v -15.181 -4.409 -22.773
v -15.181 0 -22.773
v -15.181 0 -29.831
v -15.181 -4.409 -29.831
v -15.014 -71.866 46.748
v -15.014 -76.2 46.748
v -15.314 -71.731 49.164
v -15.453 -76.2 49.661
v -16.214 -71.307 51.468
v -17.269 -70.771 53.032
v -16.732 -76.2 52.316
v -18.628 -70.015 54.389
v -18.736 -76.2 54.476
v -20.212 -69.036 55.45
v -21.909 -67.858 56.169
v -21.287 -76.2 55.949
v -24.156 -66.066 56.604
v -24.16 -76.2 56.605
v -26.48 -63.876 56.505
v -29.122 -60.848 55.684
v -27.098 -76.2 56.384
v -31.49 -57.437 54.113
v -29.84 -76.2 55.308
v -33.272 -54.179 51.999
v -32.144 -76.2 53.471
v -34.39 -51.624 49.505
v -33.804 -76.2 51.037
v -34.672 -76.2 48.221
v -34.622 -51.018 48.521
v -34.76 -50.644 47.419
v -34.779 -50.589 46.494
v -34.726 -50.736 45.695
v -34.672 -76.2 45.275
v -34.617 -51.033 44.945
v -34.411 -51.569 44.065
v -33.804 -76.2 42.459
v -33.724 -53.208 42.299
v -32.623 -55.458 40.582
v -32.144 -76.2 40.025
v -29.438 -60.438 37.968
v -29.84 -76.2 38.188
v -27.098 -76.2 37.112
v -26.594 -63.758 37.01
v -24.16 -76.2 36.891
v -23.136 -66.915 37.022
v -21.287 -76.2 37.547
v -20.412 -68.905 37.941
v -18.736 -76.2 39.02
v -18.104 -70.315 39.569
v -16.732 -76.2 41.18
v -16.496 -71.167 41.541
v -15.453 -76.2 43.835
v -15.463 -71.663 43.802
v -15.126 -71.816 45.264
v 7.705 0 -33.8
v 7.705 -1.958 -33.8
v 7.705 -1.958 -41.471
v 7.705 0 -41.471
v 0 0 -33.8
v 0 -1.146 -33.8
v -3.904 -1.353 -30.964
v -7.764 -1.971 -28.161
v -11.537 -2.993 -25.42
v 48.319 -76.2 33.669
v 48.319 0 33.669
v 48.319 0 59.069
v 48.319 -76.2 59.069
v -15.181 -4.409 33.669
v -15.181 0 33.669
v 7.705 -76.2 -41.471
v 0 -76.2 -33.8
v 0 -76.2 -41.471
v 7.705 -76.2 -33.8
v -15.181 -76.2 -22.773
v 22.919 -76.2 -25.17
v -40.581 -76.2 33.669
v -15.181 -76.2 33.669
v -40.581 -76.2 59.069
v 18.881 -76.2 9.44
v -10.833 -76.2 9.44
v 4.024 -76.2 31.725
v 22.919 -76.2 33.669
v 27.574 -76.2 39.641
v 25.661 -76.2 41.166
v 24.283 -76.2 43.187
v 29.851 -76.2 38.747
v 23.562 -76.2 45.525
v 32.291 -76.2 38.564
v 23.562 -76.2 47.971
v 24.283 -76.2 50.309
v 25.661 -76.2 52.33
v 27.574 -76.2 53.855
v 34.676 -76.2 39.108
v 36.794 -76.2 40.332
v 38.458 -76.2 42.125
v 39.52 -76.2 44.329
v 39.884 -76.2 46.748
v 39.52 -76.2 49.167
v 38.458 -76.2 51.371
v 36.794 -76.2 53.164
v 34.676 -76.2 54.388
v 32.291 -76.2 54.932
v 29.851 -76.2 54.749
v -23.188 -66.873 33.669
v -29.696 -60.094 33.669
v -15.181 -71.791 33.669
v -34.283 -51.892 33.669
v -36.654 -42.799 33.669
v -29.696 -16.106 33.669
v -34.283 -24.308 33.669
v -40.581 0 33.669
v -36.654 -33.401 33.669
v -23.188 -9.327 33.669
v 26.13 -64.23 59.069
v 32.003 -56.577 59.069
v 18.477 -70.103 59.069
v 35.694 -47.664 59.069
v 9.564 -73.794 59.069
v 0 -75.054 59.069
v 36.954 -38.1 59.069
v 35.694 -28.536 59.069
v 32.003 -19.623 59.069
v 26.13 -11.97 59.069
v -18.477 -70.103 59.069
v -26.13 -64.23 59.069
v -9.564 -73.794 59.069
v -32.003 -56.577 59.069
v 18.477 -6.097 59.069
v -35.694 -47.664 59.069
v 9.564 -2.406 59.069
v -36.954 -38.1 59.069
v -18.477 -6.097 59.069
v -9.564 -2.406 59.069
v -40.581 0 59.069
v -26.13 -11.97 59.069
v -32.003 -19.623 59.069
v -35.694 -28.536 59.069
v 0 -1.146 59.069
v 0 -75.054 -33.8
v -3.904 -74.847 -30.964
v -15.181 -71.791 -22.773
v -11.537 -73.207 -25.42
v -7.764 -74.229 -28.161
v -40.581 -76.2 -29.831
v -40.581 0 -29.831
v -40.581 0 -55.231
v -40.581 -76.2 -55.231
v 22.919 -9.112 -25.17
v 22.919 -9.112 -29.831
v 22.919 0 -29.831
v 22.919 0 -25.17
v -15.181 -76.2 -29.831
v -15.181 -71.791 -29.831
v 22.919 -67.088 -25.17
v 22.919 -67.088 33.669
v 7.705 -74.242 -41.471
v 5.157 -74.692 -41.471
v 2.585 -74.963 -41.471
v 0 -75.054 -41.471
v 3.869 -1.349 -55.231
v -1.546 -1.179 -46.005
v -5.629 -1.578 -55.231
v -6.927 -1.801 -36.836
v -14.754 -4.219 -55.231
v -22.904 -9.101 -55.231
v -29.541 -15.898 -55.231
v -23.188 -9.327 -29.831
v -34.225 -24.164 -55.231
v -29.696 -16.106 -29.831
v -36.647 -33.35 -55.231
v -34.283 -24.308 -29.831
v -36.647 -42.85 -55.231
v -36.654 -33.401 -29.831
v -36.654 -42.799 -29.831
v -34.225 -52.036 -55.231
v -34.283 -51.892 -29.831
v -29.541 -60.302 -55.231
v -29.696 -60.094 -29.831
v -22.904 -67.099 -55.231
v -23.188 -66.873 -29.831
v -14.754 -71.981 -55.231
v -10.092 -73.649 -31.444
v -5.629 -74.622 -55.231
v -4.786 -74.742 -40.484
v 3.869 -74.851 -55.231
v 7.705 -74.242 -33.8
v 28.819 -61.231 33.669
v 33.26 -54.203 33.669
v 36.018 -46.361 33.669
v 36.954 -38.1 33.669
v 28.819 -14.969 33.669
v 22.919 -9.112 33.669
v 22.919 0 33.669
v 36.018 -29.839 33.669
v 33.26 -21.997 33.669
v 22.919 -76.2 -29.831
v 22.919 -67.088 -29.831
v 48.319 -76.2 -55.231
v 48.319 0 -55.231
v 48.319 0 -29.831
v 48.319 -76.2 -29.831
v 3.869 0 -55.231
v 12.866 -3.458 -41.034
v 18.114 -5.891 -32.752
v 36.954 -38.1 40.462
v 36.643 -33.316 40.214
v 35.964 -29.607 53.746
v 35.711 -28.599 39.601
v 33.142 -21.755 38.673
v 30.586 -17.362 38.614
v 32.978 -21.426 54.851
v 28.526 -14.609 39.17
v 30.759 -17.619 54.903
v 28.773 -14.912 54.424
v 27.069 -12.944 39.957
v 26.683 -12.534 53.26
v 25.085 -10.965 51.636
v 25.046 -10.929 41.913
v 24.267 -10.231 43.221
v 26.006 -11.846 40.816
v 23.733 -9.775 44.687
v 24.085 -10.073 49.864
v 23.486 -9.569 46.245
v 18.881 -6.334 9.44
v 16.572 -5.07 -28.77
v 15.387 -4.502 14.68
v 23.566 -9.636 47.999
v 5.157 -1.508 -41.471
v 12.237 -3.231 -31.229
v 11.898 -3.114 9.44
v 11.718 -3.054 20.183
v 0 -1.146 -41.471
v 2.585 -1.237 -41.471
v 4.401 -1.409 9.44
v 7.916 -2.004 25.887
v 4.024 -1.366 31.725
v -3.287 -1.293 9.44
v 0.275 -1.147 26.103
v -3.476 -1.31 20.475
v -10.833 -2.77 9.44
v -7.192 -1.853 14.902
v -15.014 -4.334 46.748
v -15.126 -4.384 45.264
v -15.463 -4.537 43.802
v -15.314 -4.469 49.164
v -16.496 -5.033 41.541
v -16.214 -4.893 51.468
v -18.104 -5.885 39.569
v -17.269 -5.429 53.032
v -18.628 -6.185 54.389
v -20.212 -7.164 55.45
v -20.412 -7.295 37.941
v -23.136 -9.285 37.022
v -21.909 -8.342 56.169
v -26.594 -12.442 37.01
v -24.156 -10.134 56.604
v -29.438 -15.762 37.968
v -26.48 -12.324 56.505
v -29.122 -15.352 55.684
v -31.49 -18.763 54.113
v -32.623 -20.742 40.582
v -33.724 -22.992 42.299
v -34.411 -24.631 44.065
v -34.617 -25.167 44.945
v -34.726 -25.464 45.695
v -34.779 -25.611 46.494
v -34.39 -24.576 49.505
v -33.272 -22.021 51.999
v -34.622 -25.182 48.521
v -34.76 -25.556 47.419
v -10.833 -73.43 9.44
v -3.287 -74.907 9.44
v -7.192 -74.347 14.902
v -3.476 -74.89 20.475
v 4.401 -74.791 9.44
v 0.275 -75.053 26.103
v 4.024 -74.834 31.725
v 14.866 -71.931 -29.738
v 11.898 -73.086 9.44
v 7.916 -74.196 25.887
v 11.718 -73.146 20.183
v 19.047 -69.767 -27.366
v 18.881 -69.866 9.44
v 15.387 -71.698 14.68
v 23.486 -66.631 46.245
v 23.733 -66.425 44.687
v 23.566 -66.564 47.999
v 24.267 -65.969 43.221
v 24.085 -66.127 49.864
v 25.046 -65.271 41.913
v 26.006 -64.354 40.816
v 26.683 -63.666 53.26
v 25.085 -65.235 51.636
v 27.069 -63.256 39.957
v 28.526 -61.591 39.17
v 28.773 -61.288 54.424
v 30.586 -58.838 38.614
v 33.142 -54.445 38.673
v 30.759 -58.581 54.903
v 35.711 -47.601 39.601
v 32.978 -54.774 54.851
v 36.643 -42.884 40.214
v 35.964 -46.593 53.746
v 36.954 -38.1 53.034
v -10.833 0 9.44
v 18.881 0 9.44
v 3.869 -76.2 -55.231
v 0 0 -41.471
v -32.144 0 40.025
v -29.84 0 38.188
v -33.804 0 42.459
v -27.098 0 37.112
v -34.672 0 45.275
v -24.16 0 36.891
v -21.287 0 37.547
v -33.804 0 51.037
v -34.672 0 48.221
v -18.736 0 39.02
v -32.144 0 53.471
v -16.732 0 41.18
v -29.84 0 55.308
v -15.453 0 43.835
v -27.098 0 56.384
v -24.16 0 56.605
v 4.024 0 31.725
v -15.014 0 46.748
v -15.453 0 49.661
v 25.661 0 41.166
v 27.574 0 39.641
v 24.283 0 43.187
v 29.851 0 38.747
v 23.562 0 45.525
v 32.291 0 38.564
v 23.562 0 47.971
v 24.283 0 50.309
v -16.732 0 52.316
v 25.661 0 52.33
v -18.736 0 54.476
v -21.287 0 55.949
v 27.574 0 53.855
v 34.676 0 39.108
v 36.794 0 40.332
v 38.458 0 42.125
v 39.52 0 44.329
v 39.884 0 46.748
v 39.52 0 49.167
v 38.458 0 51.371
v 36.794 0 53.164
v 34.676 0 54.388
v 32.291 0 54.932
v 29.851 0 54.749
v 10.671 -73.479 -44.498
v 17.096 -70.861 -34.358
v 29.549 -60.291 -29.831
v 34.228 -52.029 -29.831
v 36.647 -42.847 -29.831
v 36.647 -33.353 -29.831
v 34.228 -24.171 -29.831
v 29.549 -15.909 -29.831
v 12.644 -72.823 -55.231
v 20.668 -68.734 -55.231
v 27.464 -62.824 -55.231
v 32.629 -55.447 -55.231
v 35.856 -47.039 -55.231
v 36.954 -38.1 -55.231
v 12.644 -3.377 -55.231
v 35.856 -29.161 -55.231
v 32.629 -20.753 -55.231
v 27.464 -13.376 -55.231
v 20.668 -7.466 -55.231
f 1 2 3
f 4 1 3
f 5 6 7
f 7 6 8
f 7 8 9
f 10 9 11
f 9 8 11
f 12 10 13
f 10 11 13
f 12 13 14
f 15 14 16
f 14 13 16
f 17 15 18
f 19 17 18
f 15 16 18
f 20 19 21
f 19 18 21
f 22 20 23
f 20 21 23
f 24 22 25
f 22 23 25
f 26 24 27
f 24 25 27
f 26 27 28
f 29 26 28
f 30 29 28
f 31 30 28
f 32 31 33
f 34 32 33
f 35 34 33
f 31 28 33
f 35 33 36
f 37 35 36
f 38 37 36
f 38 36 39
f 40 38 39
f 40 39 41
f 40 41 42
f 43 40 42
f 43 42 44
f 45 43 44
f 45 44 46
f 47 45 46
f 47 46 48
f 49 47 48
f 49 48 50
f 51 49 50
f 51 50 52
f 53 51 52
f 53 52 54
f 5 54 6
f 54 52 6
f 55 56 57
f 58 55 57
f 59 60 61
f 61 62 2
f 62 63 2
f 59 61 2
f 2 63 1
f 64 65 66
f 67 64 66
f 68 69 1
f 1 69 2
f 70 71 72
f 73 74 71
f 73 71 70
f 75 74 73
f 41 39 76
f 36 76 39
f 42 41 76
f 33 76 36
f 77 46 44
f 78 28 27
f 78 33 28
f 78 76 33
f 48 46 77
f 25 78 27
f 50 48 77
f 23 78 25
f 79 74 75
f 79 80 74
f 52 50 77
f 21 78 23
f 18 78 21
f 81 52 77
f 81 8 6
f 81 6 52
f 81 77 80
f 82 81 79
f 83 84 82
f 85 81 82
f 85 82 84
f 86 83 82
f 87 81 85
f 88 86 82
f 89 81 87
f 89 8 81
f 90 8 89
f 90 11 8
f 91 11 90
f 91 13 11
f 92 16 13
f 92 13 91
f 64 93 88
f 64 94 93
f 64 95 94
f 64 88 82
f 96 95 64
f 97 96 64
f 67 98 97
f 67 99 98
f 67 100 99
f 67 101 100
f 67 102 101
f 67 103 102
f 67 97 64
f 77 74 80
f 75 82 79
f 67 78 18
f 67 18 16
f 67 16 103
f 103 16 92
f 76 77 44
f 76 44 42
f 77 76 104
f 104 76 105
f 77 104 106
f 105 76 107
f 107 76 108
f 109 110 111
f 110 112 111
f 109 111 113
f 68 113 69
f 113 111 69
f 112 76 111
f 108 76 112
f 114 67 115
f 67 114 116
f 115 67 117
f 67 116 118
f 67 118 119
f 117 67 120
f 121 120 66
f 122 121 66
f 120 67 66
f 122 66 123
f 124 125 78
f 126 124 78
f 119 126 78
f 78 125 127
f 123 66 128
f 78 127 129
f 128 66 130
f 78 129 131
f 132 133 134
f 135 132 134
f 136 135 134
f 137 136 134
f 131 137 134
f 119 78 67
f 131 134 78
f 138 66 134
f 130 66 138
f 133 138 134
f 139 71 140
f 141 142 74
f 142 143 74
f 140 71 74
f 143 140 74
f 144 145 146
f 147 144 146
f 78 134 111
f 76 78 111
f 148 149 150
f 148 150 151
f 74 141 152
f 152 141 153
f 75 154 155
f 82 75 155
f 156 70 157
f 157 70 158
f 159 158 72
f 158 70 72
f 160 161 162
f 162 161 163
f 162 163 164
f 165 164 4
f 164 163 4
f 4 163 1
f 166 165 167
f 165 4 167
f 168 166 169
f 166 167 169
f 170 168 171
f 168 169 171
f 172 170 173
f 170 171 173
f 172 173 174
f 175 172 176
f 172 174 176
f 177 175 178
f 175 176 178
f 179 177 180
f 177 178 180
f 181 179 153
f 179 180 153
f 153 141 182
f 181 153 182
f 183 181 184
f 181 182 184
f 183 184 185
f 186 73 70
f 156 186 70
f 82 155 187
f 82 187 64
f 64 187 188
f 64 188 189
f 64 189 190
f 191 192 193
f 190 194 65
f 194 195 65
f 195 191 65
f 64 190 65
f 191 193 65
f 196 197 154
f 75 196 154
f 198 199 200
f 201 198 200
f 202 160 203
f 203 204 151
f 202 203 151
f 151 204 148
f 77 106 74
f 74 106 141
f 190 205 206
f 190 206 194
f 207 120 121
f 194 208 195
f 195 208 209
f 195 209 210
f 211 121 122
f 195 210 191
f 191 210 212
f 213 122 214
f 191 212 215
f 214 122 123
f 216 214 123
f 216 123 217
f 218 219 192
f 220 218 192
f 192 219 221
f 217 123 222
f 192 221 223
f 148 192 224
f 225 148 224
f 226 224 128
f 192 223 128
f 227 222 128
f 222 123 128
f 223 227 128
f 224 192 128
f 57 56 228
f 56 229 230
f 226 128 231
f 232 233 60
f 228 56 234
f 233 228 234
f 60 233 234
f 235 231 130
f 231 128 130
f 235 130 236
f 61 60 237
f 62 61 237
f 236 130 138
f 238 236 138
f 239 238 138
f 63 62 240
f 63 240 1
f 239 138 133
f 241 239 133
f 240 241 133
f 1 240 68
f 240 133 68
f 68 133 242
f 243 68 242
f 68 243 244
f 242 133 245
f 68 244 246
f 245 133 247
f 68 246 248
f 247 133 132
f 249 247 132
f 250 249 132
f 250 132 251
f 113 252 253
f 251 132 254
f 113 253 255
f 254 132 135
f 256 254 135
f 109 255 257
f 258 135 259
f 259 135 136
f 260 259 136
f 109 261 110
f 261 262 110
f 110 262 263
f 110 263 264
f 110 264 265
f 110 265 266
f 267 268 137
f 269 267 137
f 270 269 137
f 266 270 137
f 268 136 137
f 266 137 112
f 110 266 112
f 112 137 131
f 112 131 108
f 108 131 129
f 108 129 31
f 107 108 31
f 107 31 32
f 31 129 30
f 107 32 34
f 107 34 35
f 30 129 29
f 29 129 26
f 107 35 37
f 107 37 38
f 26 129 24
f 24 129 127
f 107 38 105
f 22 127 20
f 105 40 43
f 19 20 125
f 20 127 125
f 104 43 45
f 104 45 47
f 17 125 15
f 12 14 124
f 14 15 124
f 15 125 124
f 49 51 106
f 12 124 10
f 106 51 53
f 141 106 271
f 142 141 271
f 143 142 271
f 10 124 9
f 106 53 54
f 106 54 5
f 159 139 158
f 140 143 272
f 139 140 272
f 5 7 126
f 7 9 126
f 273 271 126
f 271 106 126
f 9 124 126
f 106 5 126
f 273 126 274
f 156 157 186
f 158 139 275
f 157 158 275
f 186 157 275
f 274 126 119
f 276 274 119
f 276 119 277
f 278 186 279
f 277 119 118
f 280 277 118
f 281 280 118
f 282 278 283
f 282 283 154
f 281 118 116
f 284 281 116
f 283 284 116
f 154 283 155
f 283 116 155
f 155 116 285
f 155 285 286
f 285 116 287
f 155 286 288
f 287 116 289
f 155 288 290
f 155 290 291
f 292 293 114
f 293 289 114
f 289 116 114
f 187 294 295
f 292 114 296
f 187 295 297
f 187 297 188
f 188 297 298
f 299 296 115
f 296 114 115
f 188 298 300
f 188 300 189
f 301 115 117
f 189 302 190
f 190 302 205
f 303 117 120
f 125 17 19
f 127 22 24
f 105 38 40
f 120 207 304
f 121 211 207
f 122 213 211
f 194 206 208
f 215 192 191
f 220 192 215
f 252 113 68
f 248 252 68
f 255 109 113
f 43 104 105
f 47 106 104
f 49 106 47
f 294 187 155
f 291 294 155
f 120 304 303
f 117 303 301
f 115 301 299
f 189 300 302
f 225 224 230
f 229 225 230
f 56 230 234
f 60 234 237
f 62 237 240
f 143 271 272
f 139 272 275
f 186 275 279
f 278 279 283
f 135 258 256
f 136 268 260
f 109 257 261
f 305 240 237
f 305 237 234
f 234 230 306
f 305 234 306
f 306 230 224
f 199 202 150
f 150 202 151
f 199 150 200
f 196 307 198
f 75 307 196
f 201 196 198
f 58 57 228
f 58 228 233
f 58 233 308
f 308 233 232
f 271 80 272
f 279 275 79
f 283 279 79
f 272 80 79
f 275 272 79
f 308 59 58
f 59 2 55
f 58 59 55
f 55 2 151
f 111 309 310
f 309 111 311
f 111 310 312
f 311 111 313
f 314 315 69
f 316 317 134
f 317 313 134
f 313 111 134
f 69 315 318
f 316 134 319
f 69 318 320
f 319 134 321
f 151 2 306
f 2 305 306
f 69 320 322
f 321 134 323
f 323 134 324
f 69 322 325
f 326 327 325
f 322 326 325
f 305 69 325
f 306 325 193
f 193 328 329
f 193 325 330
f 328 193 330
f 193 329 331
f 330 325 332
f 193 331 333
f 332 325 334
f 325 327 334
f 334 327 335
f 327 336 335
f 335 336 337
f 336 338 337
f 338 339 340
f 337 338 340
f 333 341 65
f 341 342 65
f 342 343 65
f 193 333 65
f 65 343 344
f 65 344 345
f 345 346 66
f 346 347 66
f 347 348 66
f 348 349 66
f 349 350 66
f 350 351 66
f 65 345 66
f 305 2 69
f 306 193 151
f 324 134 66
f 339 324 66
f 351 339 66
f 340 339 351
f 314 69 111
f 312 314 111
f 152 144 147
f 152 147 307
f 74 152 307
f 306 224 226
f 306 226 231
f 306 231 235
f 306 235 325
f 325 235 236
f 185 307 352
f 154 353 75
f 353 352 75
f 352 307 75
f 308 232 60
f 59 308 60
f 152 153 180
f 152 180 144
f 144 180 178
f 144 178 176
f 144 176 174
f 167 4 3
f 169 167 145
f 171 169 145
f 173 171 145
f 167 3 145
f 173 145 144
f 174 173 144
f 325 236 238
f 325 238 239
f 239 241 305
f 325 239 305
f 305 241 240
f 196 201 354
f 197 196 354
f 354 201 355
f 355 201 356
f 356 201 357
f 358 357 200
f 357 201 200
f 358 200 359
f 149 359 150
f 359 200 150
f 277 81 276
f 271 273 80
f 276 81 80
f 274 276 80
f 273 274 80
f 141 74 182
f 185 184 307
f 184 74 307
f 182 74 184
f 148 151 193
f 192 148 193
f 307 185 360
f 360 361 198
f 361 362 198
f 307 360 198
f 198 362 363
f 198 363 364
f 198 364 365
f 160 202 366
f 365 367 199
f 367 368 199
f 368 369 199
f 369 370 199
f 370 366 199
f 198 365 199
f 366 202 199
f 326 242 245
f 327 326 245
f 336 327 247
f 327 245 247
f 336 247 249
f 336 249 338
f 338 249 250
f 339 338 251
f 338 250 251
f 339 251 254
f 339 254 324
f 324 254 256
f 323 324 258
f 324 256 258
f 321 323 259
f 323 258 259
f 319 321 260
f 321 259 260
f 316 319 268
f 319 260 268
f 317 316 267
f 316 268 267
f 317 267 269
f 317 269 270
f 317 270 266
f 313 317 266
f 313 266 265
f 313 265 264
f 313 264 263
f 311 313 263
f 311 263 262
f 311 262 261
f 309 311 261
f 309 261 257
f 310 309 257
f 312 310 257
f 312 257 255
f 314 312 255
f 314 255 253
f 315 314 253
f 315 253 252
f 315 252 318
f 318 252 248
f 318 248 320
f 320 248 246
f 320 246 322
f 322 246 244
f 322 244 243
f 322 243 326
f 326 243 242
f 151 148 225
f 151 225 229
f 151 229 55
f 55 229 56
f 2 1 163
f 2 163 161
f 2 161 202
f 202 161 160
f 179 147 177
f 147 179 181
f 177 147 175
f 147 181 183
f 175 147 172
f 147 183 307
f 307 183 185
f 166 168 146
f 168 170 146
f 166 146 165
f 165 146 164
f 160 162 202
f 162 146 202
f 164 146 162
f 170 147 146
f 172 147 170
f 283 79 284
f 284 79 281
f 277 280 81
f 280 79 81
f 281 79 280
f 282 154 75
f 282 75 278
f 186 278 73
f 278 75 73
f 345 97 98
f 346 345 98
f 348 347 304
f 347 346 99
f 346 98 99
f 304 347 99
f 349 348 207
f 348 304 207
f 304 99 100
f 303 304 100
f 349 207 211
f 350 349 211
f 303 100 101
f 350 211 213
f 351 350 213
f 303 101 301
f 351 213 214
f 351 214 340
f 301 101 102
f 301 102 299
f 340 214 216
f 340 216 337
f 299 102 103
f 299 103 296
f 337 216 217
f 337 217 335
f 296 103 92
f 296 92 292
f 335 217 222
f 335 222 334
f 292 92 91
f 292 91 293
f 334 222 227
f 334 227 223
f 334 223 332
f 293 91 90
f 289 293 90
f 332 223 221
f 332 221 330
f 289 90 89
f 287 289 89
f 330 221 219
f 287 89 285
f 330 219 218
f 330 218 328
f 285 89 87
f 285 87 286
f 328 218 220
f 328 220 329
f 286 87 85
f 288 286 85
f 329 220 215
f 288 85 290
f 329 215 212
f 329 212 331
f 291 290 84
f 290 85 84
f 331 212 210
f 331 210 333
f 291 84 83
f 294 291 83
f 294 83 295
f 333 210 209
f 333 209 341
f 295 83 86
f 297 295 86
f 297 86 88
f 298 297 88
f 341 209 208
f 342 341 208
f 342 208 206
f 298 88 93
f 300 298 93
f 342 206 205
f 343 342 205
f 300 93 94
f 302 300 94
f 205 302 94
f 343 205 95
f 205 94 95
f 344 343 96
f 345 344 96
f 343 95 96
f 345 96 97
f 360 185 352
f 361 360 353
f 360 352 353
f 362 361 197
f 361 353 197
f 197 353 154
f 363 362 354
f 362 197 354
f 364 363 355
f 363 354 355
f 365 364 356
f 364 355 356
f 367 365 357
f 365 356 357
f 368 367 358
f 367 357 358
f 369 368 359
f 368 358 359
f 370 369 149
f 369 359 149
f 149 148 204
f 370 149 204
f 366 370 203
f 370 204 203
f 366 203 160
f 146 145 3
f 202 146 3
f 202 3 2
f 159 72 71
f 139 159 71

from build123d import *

# Parameters (mm, degrees)
F1_DEPTH  = 76.2
F2_R      = 23.902381
F3_DEPTH  = 63.501
F5_DEPTH  = 76.201
F6_R      = 36.953627
F7_DEPTH  = 114.301
F8_R      = 9.884174
F8_R_2    = 8.206909
F9_DEPTH  = 76.201
F11_DEPTH = 76.201


with BuildPart() as f1:
    # F0 (on Front) → F1 (new body)
    with BuildSketch(Plane.XZ):
        Polygon((-40.581046, -29.830852), (-40.581046, -55.230852), (48.318954, -55.230852), (48.318954, -29.830852), (22.918954, -29.830852), (22.918954, 33.669148), (48.318954, 33.669148), (48.318954, 59.069148), (-40.581046, 59.069148), (-40.581046, 33.669148), (-15.181046, 33.669148), (-15.181046, -29.830852), align=None)
    extrude(amount=F1_DEPTH)

    # F2 (on face) → F3 (cut, through all)
    with BuildSketch(Plane.YZ.offset(22.918954)):
        with Locations((-38.1, 0)):
            Circle(F2_R)
    extrude(amount=-F3_DEPTH, mode=Mode.SUBTRACT)

    # F4 (on face) → F5 (cut, through all)
    with BuildSketch(Plane.XZ.offset(76.2)):
        Polygon((4.023716, 31.725436), (-10.833076, 9.440252), (18.880501, 9.440252), align=None)
    extrude(amount=-F5_DEPTH, mode=Mode.SUBTRACT)

    # F6 (on face) → F7 (cut, through all)
    with BuildSketch(Plane.XY.offset(59.069148)):
        with Locations((0, -38.1)):
            Circle(F6_R)
    extrude(amount=-F7_DEPTH, mode=Mode.SUBTRACT)

    # F8 (on face) → F9 (cut, through all)
    with BuildSketch(Plane.XZ.offset(76.2)):
        with Locations((-24.898209, 46.747979)):
            Circle(F8_R)
        with Locations((31.677213, 46.747979)):
            Circle(F8_R_2)
    extrude(amount=-F9_DEPTH, mode=Mode.SUBTRACT)

    # F10 (on face) → F11 (cut, through all)
    with BuildSketch(Plane.XZ.offset(76.2)):
        Polygon((0, -33.80008), (-15.181046, -22.77267), (3.868954, -55.230852), (22.918954, -25.169933), (7.704584, -33.80008), (7.704584, -41.471325), (0, -41.471325), align=None)
    extrude(amount=-F11_DEPTH, mode=Mode.SUBTRACT)


solid = f1.part
